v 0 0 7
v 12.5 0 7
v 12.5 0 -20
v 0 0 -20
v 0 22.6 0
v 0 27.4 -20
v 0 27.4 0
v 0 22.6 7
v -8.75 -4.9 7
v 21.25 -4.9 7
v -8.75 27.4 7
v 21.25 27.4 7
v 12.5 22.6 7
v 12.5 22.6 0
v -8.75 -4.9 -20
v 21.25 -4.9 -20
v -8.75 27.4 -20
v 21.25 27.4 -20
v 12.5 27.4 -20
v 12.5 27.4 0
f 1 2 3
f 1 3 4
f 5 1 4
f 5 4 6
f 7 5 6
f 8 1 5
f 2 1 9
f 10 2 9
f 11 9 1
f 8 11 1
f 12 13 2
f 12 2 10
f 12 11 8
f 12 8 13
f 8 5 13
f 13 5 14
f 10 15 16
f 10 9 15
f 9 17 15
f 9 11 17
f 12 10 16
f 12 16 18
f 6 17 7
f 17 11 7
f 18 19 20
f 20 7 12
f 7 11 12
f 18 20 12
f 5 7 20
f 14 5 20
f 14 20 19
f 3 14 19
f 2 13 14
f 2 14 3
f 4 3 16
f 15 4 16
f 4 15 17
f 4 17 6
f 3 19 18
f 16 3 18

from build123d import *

# Parameters (mm, degrees)
F1_W     = 30
F1_H     = 32.3
F2_DEPTH = 7
F0_W     = 12.5
F0_H     = 22.6
F3_DEPTH = 7
F4_W     = 8.75
F4_H     = 4.9
F4_W_2   = 12.5
F4_H_2   = 22.6
F4_H_3   = 4.8
F5_DEPTH = 20


with BuildPart() as f2:
    # F1 (on Top) → F2 (new body)
    with BuildSketch(Plane.XY):
        with Locations((6.25, 11.25)):
            Rectangle(F1_W, F1_H)
    extrude(amount=F2_DEPTH)

    # F0 (on Top) → F3 (cut)
    with BuildSketch(Plane.XY):
        with Locations((6.25, 11.3)):
            Rectangle(F0_W, F0_H)
    extrude(amount=F3_DEPTH, mode=Mode.SUBTRACT)

    # F4 (on Top) → F5 (join)
    with BuildSketch(Plane.XY):
        with Locations((-4.375, -2.45)):
            Rectangle(F4_W, F4_H)
        with Locations((6.25, -2.45)):
            Rectangle(F4_W_2, F4_H)
        with Locations((-4.375, 11.3)):
            Rectangle(F4_W, F4_H_2)
        with Locations((-4.375, 25)):
            Rectangle(F4_W, F4_H_3)
        with Locations((16.875, 11.3)):
            Rectangle(F4_W, F4_H_2)
        with Locations((16.875, -2.45)):
            Rectangle(F4_W, F4_H)
        with Locations((16.875, 25)):
            Rectangle(F4_W, F4_H_3)
    extrude(amount=-F5_DEPTH)


solid = f2.part
